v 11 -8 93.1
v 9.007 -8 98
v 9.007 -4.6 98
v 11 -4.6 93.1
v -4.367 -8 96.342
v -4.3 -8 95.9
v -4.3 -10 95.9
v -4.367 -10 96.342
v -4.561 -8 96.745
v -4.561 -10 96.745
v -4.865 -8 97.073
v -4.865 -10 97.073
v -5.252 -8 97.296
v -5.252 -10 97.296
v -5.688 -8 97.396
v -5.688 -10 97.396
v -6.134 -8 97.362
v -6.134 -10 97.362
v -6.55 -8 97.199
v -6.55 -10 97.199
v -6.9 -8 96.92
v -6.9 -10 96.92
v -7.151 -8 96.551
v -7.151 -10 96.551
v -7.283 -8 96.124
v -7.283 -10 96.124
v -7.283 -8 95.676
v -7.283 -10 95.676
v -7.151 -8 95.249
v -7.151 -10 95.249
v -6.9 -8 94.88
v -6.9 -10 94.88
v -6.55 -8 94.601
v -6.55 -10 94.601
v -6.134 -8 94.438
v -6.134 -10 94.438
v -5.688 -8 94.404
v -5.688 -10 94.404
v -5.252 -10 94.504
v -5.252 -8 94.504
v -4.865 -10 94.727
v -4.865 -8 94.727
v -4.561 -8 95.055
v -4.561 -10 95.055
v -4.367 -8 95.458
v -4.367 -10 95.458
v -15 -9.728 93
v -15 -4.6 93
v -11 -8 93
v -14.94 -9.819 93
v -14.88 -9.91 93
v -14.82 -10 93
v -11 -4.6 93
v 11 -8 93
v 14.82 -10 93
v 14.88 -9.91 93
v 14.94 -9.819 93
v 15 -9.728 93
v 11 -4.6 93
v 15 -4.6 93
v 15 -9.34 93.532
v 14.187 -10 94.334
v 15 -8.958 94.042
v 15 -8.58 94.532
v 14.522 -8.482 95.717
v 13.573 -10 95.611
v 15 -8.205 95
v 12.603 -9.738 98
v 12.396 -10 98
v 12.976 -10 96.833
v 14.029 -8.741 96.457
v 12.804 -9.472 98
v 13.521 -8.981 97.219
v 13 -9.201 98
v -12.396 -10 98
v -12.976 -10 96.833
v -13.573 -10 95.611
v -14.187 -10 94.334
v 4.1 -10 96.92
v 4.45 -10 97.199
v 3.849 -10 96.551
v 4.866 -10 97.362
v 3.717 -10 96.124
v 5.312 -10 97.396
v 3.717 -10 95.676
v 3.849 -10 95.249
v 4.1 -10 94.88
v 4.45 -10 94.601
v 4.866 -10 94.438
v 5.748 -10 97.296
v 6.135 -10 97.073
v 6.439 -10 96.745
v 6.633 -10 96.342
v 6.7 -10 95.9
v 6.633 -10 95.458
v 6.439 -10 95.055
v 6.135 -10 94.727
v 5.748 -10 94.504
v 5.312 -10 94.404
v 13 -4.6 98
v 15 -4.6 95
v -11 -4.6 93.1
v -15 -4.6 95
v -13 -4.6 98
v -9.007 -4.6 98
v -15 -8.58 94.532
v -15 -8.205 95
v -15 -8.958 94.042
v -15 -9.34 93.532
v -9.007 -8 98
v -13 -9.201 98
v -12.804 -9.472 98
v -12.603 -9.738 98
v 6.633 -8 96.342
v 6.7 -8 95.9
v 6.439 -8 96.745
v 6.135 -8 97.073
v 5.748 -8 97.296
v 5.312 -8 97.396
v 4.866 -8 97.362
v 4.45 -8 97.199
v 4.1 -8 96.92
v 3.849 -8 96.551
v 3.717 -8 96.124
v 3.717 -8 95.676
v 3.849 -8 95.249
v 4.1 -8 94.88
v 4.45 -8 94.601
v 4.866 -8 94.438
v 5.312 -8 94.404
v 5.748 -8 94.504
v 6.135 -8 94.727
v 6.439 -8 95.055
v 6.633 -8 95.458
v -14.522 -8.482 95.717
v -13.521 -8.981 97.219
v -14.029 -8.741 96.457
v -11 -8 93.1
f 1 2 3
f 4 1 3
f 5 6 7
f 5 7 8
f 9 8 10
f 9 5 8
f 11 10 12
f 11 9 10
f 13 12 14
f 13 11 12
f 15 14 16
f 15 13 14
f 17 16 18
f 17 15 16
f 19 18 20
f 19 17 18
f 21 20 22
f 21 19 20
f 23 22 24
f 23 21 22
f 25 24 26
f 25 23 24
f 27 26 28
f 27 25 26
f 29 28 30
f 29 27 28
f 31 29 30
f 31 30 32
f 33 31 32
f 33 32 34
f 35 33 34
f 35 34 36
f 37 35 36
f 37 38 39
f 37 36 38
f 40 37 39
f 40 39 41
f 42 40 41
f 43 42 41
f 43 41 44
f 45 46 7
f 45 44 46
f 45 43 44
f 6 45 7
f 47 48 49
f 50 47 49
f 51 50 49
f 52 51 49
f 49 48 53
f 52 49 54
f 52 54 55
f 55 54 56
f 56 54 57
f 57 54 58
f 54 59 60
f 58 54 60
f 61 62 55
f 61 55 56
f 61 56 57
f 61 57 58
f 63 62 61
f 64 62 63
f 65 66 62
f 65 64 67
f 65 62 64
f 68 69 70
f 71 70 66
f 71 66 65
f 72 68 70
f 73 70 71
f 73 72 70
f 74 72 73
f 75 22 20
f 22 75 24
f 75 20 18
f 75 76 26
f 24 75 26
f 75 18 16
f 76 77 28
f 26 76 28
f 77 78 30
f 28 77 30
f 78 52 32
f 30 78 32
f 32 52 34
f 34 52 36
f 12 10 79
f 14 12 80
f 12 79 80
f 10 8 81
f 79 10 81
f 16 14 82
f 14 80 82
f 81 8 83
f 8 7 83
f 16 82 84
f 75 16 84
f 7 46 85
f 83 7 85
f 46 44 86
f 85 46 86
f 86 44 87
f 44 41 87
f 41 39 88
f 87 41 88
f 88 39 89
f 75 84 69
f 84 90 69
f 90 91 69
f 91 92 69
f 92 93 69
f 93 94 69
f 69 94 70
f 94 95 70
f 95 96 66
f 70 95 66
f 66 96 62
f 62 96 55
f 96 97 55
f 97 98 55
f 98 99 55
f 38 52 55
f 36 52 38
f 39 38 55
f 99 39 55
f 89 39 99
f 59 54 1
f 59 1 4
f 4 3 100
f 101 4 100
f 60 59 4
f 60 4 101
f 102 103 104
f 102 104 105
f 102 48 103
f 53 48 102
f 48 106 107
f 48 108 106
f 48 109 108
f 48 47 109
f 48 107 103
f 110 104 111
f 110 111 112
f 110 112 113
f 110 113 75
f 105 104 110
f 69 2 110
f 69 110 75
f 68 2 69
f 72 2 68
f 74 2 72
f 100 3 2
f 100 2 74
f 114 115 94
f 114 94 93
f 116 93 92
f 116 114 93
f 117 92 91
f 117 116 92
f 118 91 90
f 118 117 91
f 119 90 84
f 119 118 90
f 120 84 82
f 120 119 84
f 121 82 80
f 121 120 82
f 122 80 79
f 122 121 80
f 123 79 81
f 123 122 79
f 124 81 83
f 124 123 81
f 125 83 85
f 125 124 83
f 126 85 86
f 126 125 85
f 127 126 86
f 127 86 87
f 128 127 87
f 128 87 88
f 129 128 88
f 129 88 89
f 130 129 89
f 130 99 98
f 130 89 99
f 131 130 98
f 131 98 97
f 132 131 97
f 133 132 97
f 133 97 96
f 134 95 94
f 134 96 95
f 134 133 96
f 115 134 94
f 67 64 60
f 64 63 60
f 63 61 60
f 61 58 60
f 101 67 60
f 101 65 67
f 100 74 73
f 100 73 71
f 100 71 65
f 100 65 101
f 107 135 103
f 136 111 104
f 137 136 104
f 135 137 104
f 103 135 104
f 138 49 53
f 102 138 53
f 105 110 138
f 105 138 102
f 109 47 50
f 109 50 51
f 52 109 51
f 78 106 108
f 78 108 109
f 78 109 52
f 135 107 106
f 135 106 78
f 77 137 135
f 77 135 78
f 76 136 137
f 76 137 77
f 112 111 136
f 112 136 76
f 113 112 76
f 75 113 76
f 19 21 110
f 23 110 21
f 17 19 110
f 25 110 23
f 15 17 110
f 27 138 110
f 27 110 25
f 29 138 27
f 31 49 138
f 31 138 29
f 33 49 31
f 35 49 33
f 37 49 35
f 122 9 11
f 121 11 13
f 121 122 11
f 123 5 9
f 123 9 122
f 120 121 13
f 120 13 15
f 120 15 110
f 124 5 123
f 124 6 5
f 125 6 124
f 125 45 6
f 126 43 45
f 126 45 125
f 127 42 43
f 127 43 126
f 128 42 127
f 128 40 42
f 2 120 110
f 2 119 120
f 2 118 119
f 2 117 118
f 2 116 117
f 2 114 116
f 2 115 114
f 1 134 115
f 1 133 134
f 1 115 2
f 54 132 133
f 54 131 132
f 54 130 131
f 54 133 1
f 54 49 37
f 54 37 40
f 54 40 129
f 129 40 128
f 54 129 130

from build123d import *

# Parameters (mm, degrees)
BOX341_W           = 22
BOX341_H           = 4
BOX341_DEPTH       = 6
CHAMFER073_1_SIZE2 = 2.4
CHAMFER073_1_SIZE  = 5.9
CHAMFER073_2_SIZE2 = 2.4
CHAMFER073_2_SIZE  = 5.9
CYLINDER398_R      = 1.5
CYLINDER398_DEPTH  = 5
CYLINDER395_R      = 1.5
CYLINDER395_DEPTH  = 5
BOX342_W           = 30
BOX342_H           = 5.4
BOX342_DEPTH       = 5
CHAMFER074_1_SIZE2 = 2
CHAMFER074_1_SIZE  = 3
CHAMFER074_2_SIZE2 = 2
CHAMFER074_2_SIZE  = 3


with BuildPart() as cone008:
    # Cone007 → Cone007 (revolve)
    with BuildSketch(Plane(origin=(0, 0, 85), x_dir=(1, 0, 0), z_dir=(0, -1, 0))):
        Polygon((0, 0), (21, 0), (5, 41), (0, 41), align=None)
    revolve(axis=Axis((0, 0, 85), (0, 0, 1)))


with BuildPart() as chamfer096:
    # Box341 → Box341 (new body)
    with BuildSketch(Plane(origin=(-11, -8, 93), x_dir=(1, 0, 0), z_dir=(0, 0, 1))):
        with Locations((11, 2)):
            Rectangle(BOX341_W, BOX341_H)
    extrude(amount=BOX341_DEPTH)

    # Chamfer073 1
    chamfer073_1_edges = [chamfer096.edges().sort_by_distance(p)[0] for p in [
        (11, -6, 99),
    ]]
    chamfer073_1_side = chamfer096.faces().sort_by_distance((11, -6, 96))[0]
    chamfer(chamfer073_1_edges, length=CHAMFER073_1_SIZE, length2=CHAMFER073_1_SIZE2, reference=chamfer073_1_side)

    # Chamfer073 2
    chamfer073_2_edges = [chamfer096.edges().sort_by_distance(p)[0] for p in [
        (-11, -6, 99),
    ]]
    chamfer073_2_side = chamfer096.faces().sort_by_distance((-11, -6, 96))[0]
    chamfer(chamfer073_2_edges, length=CHAMFER073_2_SIZE, length2=CHAMFER073_2_SIZE2, reference=chamfer073_2_side)


with BuildPart() as cylinder398:
    # Cylinder398 → Cylinder398 (new body)
    with BuildSketch(Plane(origin=(5.2, -6, 95.9), x_dir=(1, 0, 0), z_dir=(0, -1, 0))):
        Circle(CYLINDER398_R)
    extrude(amount=CYLINDER398_DEPTH)


with BuildPart() as cut_out001:
    # Cylinder395 → Cylinder395 (new body)
    with BuildSketch(Plane(origin=(-5.8, -6, 95.9), x_dir=(1, 0, 0), z_dir=(0, -1, 0))):
        Circle(CYLINDER395_R)
    extrude(amount=CYLINDER395_DEPTH)

    # Compound201: union Cylinder398
    add(cylinder398.part)

    # Fusion087: union Chamfer096
    add(chamfer096.part)


with BuildPart() as support_bmp280:
    # Box342 → Box342 (new body)
    with BuildSketch(Plane(origin=(-15, -10, 93), x_dir=(1, 0, 0), z_dir=(0, 0, 1))):
        with Locations((15, 2.7)):
            Rectangle(BOX342_W, BOX342_H)
    extrude(amount=BOX342_DEPTH)

    # Chamfer074 1
    chamfer074_1_edges = [support_bmp280.edges().sort_by_distance(p)[0] for p in [
        (15, -7.3, 98),
    ]]
    chamfer074_1_side = support_bmp280.faces().sort_by_distance((15, -7.3, 95.5))[0]
    chamfer(chamfer074_1_edges, length=CHAMFER074_1_SIZE, length2=CHAMFER074_1_SIZE2, reference=chamfer074_1_side)

    # Chamfer074 2
    chamfer074_2_edges = [support_bmp280.edges().sort_by_distance(p)[0] for p in [
        (-15, -7.3, 98),
    ]]
    chamfer074_2_side = support_bmp280.faces().sort_by_distance((-15, -7.3, 95.5))[0]
    chamfer(chamfer074_2_edges, length=CHAMFER074_2_SIZE, length2=CHAMFER074_2_SIZE2, reference=chamfer074_2_side)

    # Cut226: cut cut-out001
    add(cut_out001.part, mode=Mode.SUBTRACT)

    # Common007: intersect Cone008
    add(cone008.part, mode=Mode.INTERSECT)


solid = support_bmp280.part
